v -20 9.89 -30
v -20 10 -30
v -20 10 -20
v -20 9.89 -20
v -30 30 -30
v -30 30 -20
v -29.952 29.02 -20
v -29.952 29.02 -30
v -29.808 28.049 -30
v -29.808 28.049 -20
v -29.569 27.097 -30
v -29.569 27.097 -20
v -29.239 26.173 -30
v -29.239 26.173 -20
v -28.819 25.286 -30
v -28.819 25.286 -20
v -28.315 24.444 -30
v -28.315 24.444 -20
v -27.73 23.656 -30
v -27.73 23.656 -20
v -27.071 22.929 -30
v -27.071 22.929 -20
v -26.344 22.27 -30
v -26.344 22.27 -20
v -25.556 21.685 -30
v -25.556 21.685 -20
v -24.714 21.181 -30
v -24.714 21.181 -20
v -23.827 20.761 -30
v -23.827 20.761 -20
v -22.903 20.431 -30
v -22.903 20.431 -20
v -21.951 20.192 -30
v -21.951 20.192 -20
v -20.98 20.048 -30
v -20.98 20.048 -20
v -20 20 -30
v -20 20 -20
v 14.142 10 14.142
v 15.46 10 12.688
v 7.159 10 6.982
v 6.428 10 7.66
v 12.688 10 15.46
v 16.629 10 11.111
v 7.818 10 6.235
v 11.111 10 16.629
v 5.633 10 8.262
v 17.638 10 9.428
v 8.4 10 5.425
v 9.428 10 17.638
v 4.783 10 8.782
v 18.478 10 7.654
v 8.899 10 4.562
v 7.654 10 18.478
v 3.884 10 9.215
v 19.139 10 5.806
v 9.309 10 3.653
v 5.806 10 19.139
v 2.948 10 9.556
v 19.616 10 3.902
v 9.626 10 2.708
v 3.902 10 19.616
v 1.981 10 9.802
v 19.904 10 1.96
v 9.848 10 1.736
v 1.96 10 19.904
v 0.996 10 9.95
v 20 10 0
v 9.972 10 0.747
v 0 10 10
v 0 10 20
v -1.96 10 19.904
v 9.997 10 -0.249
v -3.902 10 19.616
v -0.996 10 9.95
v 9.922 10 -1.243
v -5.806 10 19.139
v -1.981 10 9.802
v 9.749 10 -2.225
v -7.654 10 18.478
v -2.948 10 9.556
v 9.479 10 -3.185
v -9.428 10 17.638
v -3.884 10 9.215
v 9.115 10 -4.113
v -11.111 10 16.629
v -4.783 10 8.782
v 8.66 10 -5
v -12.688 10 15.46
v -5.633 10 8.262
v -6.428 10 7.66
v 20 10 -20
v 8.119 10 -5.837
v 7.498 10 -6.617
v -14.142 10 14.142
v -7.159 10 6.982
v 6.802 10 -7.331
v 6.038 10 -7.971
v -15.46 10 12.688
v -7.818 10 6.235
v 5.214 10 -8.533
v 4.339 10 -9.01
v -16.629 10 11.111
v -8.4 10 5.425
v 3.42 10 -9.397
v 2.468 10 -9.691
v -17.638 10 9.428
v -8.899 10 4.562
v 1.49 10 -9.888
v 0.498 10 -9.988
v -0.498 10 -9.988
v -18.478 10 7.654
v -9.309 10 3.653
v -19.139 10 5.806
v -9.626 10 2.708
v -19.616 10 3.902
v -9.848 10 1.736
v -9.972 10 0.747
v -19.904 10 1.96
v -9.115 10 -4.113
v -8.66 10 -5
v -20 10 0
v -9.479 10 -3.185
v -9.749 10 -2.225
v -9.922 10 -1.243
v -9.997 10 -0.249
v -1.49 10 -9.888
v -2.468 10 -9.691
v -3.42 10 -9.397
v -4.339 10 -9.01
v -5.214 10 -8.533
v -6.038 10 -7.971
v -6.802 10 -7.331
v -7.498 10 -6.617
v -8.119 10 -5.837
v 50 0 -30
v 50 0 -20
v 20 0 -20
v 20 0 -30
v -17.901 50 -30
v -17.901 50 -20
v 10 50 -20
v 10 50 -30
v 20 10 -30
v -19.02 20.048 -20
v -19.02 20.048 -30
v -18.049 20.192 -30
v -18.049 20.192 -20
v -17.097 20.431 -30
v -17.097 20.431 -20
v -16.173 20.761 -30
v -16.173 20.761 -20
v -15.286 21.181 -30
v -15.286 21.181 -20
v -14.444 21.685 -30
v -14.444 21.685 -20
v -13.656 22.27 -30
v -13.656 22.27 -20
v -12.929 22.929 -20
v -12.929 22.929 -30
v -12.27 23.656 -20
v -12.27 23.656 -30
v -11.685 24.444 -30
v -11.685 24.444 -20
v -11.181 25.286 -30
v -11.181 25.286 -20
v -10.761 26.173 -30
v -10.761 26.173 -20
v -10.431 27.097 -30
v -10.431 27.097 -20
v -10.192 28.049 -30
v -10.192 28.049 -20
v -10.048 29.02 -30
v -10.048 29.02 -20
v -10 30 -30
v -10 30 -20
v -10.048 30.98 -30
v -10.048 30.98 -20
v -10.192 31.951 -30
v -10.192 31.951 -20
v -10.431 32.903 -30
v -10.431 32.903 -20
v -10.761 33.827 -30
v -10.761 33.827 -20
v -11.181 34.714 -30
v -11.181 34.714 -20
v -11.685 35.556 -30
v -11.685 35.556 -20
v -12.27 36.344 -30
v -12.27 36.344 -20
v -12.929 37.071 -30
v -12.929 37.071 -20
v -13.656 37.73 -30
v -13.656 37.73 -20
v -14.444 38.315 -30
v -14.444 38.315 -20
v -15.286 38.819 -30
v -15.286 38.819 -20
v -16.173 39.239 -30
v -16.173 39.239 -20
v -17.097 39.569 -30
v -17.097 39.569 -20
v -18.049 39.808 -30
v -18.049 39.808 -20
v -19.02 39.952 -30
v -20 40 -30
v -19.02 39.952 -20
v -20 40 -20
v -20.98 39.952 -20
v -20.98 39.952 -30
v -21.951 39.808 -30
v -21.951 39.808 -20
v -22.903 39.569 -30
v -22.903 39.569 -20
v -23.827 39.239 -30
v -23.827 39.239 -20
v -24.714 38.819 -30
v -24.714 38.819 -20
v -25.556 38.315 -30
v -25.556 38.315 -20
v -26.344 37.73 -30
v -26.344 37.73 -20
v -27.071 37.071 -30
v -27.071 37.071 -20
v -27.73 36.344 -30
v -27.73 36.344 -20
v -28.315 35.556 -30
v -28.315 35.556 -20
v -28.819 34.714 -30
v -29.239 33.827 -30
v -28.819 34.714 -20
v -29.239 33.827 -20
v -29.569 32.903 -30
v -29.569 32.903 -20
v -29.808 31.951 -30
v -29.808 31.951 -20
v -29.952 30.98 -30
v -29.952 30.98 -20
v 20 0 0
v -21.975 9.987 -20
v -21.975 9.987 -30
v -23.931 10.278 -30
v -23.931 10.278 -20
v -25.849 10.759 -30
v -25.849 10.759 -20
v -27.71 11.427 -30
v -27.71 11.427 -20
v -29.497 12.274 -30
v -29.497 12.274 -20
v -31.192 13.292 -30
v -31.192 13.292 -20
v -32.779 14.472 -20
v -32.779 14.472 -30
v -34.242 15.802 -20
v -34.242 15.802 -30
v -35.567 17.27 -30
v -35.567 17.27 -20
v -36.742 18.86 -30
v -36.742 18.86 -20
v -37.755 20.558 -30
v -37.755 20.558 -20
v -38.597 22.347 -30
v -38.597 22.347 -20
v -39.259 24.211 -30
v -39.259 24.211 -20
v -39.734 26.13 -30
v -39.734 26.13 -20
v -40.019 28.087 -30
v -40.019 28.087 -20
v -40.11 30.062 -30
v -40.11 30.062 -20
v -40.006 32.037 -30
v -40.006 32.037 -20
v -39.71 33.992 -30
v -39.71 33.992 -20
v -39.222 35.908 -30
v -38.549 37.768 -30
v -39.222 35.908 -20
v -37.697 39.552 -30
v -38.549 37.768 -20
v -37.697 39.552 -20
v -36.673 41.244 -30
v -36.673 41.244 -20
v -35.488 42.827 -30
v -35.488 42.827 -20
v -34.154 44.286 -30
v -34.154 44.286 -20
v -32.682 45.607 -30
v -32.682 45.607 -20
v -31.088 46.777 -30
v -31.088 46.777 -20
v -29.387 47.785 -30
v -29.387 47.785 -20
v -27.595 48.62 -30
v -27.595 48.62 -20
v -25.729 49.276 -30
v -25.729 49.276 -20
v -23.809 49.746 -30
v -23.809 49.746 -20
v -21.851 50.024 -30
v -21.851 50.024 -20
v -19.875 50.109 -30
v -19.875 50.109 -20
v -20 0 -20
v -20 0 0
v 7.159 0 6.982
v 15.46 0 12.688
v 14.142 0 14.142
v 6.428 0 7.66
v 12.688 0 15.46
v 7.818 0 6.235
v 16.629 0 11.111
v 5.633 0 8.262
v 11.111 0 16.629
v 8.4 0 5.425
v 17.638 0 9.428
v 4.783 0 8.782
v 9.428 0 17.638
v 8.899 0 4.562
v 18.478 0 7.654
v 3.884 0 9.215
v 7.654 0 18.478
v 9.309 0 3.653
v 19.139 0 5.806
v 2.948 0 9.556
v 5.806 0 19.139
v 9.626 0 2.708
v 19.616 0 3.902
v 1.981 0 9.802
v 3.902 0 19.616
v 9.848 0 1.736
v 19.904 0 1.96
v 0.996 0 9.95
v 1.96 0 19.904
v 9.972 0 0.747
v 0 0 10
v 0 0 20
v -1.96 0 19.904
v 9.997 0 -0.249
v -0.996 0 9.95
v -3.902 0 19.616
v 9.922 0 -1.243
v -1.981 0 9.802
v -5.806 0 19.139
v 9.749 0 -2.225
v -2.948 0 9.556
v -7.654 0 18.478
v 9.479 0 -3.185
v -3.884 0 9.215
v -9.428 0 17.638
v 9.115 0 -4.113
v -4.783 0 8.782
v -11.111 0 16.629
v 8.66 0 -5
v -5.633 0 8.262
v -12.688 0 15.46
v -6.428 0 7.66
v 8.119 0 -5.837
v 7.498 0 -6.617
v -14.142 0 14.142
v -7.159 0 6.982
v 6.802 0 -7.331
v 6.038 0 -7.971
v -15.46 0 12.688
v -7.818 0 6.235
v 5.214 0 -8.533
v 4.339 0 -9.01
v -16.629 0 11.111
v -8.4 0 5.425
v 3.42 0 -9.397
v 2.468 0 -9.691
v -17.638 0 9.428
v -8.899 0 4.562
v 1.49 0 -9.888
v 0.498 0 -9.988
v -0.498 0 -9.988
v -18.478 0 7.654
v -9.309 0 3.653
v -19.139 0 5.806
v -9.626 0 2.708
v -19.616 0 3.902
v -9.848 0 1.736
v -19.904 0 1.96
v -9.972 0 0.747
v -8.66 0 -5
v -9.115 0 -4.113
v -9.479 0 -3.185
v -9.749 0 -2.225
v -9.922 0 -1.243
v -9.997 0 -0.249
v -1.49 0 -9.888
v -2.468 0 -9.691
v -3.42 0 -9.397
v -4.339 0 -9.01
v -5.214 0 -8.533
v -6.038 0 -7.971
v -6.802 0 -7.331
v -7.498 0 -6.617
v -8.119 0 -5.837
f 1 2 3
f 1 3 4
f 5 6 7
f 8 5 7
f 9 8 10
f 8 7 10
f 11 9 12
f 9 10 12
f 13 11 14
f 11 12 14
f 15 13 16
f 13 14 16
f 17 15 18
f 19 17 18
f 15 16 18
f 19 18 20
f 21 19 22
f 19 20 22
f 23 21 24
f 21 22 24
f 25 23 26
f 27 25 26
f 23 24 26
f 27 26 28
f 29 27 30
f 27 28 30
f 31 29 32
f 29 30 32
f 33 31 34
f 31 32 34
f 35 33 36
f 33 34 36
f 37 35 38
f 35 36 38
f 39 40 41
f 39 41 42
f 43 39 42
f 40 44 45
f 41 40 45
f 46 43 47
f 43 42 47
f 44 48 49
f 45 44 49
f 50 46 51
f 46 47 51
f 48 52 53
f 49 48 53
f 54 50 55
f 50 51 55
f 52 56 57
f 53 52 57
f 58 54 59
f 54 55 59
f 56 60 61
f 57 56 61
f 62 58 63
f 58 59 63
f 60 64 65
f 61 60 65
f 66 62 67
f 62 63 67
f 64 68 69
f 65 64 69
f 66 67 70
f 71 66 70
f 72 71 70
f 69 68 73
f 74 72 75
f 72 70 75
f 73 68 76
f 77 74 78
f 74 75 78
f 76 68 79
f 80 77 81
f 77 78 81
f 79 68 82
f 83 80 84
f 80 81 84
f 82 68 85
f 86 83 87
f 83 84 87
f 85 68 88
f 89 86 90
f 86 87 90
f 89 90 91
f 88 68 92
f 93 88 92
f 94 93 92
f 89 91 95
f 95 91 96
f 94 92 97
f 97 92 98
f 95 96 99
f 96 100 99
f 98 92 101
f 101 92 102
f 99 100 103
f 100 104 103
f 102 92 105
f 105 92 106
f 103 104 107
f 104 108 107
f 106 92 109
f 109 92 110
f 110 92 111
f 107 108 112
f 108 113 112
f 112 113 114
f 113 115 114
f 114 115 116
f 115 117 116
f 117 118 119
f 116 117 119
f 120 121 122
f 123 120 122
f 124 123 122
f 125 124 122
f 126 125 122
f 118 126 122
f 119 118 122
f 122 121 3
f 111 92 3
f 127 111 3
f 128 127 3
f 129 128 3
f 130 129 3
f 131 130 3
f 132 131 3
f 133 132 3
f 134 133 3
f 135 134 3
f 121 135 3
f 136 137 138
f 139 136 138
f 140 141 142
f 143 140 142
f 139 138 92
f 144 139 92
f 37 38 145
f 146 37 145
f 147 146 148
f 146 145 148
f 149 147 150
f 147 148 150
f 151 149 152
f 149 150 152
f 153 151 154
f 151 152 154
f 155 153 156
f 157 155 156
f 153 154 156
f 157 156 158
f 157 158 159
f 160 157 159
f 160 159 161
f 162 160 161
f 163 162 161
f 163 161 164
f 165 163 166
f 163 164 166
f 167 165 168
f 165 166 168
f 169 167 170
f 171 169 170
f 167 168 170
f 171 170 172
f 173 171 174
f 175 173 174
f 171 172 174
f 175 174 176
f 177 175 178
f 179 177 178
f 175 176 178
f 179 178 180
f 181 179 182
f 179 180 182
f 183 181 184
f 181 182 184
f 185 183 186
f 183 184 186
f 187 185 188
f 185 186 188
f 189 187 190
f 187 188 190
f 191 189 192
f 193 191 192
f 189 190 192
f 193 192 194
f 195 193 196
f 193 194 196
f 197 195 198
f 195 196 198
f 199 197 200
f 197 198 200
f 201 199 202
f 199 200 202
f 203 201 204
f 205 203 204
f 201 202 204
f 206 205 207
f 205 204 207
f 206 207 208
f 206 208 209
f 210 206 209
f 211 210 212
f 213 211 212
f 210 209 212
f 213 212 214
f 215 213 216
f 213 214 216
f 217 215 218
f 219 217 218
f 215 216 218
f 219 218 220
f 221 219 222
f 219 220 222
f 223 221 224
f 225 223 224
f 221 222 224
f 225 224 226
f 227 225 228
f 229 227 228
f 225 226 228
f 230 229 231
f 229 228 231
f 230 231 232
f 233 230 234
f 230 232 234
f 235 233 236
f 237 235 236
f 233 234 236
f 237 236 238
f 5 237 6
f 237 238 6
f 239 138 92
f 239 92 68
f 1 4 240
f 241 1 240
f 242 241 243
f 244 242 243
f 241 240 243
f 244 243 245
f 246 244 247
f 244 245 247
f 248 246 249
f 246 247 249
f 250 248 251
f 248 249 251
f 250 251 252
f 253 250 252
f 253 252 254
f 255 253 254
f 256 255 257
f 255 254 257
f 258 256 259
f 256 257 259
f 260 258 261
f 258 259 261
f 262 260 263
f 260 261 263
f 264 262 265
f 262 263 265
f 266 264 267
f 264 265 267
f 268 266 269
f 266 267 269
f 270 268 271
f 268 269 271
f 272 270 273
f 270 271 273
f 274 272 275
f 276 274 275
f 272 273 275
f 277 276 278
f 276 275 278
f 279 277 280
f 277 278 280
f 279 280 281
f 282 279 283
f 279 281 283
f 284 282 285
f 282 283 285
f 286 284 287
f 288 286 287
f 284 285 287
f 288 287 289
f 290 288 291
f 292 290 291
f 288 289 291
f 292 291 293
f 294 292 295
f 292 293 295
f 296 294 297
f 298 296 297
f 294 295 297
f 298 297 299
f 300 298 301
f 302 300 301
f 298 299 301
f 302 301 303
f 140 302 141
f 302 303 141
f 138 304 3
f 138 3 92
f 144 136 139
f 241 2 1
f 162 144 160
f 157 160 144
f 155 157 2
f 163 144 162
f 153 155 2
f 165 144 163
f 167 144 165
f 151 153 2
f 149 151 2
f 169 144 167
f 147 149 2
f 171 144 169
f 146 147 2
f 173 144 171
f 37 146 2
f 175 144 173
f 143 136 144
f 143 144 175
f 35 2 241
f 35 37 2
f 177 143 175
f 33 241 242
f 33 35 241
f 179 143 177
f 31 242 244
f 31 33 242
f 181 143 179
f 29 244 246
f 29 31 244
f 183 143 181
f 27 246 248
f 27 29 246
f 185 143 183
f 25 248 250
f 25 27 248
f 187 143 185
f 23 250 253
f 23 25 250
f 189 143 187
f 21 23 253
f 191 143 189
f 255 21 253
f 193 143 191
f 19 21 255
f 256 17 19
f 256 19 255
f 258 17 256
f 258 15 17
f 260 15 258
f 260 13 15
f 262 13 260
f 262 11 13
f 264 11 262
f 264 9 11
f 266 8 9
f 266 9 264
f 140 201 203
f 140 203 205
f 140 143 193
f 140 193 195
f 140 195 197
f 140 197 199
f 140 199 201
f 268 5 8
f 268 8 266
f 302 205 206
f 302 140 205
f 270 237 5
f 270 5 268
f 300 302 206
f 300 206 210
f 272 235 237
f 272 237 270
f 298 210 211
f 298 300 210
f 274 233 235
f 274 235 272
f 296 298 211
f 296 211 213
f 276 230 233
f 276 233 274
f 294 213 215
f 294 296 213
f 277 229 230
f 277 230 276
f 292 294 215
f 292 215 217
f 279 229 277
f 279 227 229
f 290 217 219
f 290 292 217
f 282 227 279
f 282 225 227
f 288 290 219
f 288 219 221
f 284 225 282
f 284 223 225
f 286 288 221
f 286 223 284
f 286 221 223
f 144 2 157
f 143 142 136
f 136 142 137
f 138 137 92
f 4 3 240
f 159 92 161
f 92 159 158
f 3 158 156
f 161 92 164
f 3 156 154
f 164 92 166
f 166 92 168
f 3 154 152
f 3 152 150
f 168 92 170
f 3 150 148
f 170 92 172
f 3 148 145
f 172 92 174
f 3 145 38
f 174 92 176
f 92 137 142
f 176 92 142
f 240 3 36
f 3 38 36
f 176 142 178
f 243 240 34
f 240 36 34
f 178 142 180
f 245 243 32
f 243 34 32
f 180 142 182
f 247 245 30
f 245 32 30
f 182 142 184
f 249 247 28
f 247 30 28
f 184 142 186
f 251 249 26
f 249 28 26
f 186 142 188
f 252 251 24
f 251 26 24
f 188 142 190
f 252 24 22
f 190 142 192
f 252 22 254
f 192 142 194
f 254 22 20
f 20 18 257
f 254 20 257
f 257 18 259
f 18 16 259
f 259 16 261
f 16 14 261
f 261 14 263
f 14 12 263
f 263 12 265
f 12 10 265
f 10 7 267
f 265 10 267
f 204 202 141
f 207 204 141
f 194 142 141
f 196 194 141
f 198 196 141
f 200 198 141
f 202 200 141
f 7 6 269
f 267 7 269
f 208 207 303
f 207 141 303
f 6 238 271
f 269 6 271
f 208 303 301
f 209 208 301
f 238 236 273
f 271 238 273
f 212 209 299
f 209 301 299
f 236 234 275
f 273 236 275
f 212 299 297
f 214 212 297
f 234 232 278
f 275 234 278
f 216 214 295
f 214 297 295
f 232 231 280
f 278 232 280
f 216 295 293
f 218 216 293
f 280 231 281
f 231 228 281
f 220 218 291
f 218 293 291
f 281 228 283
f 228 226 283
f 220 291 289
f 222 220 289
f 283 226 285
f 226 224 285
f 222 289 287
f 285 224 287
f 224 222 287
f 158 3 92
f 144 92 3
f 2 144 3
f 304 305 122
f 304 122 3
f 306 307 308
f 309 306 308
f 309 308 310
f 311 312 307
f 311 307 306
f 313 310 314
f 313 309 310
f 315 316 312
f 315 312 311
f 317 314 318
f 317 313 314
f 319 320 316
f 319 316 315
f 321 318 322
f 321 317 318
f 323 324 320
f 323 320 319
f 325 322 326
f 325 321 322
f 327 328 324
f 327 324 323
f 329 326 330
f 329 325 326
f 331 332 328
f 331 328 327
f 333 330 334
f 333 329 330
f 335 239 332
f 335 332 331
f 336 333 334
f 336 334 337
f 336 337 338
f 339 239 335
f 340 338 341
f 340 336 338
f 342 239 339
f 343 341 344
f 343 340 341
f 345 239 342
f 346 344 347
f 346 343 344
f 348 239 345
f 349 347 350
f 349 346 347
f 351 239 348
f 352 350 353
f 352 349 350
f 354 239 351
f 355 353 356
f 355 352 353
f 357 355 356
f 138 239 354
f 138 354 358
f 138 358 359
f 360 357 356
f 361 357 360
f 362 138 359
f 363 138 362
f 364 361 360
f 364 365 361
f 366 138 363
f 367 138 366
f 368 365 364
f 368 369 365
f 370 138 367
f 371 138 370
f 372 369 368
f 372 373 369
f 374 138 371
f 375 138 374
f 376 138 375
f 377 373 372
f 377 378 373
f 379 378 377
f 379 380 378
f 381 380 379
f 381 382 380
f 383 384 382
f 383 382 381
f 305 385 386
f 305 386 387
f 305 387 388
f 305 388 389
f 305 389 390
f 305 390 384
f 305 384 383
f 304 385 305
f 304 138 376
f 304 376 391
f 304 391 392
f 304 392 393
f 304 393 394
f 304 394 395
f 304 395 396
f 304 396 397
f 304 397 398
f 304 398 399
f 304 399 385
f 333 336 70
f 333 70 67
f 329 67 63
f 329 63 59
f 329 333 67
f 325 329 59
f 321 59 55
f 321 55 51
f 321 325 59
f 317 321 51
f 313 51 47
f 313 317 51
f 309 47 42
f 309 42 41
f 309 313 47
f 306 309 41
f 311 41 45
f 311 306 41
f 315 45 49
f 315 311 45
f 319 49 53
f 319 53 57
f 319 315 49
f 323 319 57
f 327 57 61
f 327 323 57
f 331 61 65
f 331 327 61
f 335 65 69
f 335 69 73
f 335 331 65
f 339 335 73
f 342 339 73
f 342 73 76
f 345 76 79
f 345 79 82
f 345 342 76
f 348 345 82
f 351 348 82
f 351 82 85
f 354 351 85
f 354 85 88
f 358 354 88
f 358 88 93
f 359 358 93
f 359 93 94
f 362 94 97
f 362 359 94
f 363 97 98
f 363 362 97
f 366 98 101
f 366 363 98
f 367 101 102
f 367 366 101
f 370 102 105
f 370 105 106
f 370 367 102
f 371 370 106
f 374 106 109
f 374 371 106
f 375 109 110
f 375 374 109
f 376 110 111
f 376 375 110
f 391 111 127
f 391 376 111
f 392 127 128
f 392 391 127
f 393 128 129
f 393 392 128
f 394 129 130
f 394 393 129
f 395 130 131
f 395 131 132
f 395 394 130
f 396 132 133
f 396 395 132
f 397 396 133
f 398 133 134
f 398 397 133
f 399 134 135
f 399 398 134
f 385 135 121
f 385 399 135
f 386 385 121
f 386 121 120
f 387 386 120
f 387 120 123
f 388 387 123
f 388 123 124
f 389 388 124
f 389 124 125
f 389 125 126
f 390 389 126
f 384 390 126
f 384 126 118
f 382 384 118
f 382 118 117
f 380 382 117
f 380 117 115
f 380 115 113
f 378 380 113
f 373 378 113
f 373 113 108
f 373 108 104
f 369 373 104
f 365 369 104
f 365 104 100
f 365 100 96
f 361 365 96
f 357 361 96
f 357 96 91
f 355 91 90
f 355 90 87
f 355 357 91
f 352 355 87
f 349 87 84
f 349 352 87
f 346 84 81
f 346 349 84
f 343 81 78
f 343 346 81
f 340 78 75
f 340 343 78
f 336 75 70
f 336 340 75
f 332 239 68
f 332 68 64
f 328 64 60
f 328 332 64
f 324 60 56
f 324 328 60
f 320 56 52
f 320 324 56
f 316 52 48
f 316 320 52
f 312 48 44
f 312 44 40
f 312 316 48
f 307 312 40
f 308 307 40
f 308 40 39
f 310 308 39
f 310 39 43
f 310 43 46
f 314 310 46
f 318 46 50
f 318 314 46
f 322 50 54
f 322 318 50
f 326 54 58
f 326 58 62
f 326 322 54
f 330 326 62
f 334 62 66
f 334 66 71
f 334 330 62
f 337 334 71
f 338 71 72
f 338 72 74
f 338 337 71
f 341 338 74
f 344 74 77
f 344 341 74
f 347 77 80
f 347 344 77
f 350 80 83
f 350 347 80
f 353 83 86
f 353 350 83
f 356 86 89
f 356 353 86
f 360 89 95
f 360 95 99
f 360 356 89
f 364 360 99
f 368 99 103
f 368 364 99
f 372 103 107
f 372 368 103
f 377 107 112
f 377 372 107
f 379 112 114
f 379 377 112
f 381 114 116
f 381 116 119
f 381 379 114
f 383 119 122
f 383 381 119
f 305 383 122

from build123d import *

# Parameters (mm, degrees)
SKETCH1_R           = 10
BOSS_EXTRUDE1_DEPTH = 10
BOSS_EXTRUDE2_DEPTH = 10


with BuildPart() as part:
    # Sketch1 → Boss-Extrude1 (new body)
    with BuildSketch(Plane(origin=(0, 0, 0), x_dir=(1, 0, 0), z_dir=(0, 1, 0))):
        with BuildLine():
            Line((-20, 0), (-20, 20))
            Line((-20, 20), (20, 20))
            Line((20, 20), (20, 0))
            ThreePointArc((20, 0), (0, -20), (-20, 0))
        make_face()
        with Locations(Location((0, 0, 0), (0, 0, 270))):
            Circle(SKETCH1_R, mode=Mode.SUBTRACT)
    extrude(amount=BOSS_EXTRUDE1_DEPTH)


with BuildPart() as body_2:
    # Sketch2 → Boss-Extrude2 (new body)
    with BuildSketch(Plane(origin=(0, 0, -20), x_dir=(-1, 0, 0), z_dir=(0, 0, -1))):
        with BuildLine():
            Line((20, 20), (20, 10))
            Line((20, 10), (20, 9.890171032))
            ThreePointArc((20, 9.890171032), (40.082352955, 31.050866726), (17.901138141, 50))
            Line((17.901138141, 50), (20, 50))
            Line((20, 50), (20, 40))
            ThreePointArc((20, 40), (27.071067812, 37.071067812), (30, 30))
            ThreePointArc((30, 30), (27.071067812, 22.928932188), (20, 20))
        make_face()
        with BuildLine():
            Line((-20, 10), (20, 10))
            Line((20, 10), (20, 20))
            ThreePointArc((20, 20), (10, 30), (20, 40))
            Line((20, 40), (20, 50))
            Line((20, 50), (17.901138141, 50))
            Line((17.901138141, 50), (-10, 50))
            Line((-10, 50), (-50, 0))
            Line((-50, 0), (-20, 0))
            Line((-20, 0), (-20, 10))
        make_face()
    extrude(amount=BOSS_EXTRUDE2_DEPTH)


solid = Compound([part.part, body_2.part])
